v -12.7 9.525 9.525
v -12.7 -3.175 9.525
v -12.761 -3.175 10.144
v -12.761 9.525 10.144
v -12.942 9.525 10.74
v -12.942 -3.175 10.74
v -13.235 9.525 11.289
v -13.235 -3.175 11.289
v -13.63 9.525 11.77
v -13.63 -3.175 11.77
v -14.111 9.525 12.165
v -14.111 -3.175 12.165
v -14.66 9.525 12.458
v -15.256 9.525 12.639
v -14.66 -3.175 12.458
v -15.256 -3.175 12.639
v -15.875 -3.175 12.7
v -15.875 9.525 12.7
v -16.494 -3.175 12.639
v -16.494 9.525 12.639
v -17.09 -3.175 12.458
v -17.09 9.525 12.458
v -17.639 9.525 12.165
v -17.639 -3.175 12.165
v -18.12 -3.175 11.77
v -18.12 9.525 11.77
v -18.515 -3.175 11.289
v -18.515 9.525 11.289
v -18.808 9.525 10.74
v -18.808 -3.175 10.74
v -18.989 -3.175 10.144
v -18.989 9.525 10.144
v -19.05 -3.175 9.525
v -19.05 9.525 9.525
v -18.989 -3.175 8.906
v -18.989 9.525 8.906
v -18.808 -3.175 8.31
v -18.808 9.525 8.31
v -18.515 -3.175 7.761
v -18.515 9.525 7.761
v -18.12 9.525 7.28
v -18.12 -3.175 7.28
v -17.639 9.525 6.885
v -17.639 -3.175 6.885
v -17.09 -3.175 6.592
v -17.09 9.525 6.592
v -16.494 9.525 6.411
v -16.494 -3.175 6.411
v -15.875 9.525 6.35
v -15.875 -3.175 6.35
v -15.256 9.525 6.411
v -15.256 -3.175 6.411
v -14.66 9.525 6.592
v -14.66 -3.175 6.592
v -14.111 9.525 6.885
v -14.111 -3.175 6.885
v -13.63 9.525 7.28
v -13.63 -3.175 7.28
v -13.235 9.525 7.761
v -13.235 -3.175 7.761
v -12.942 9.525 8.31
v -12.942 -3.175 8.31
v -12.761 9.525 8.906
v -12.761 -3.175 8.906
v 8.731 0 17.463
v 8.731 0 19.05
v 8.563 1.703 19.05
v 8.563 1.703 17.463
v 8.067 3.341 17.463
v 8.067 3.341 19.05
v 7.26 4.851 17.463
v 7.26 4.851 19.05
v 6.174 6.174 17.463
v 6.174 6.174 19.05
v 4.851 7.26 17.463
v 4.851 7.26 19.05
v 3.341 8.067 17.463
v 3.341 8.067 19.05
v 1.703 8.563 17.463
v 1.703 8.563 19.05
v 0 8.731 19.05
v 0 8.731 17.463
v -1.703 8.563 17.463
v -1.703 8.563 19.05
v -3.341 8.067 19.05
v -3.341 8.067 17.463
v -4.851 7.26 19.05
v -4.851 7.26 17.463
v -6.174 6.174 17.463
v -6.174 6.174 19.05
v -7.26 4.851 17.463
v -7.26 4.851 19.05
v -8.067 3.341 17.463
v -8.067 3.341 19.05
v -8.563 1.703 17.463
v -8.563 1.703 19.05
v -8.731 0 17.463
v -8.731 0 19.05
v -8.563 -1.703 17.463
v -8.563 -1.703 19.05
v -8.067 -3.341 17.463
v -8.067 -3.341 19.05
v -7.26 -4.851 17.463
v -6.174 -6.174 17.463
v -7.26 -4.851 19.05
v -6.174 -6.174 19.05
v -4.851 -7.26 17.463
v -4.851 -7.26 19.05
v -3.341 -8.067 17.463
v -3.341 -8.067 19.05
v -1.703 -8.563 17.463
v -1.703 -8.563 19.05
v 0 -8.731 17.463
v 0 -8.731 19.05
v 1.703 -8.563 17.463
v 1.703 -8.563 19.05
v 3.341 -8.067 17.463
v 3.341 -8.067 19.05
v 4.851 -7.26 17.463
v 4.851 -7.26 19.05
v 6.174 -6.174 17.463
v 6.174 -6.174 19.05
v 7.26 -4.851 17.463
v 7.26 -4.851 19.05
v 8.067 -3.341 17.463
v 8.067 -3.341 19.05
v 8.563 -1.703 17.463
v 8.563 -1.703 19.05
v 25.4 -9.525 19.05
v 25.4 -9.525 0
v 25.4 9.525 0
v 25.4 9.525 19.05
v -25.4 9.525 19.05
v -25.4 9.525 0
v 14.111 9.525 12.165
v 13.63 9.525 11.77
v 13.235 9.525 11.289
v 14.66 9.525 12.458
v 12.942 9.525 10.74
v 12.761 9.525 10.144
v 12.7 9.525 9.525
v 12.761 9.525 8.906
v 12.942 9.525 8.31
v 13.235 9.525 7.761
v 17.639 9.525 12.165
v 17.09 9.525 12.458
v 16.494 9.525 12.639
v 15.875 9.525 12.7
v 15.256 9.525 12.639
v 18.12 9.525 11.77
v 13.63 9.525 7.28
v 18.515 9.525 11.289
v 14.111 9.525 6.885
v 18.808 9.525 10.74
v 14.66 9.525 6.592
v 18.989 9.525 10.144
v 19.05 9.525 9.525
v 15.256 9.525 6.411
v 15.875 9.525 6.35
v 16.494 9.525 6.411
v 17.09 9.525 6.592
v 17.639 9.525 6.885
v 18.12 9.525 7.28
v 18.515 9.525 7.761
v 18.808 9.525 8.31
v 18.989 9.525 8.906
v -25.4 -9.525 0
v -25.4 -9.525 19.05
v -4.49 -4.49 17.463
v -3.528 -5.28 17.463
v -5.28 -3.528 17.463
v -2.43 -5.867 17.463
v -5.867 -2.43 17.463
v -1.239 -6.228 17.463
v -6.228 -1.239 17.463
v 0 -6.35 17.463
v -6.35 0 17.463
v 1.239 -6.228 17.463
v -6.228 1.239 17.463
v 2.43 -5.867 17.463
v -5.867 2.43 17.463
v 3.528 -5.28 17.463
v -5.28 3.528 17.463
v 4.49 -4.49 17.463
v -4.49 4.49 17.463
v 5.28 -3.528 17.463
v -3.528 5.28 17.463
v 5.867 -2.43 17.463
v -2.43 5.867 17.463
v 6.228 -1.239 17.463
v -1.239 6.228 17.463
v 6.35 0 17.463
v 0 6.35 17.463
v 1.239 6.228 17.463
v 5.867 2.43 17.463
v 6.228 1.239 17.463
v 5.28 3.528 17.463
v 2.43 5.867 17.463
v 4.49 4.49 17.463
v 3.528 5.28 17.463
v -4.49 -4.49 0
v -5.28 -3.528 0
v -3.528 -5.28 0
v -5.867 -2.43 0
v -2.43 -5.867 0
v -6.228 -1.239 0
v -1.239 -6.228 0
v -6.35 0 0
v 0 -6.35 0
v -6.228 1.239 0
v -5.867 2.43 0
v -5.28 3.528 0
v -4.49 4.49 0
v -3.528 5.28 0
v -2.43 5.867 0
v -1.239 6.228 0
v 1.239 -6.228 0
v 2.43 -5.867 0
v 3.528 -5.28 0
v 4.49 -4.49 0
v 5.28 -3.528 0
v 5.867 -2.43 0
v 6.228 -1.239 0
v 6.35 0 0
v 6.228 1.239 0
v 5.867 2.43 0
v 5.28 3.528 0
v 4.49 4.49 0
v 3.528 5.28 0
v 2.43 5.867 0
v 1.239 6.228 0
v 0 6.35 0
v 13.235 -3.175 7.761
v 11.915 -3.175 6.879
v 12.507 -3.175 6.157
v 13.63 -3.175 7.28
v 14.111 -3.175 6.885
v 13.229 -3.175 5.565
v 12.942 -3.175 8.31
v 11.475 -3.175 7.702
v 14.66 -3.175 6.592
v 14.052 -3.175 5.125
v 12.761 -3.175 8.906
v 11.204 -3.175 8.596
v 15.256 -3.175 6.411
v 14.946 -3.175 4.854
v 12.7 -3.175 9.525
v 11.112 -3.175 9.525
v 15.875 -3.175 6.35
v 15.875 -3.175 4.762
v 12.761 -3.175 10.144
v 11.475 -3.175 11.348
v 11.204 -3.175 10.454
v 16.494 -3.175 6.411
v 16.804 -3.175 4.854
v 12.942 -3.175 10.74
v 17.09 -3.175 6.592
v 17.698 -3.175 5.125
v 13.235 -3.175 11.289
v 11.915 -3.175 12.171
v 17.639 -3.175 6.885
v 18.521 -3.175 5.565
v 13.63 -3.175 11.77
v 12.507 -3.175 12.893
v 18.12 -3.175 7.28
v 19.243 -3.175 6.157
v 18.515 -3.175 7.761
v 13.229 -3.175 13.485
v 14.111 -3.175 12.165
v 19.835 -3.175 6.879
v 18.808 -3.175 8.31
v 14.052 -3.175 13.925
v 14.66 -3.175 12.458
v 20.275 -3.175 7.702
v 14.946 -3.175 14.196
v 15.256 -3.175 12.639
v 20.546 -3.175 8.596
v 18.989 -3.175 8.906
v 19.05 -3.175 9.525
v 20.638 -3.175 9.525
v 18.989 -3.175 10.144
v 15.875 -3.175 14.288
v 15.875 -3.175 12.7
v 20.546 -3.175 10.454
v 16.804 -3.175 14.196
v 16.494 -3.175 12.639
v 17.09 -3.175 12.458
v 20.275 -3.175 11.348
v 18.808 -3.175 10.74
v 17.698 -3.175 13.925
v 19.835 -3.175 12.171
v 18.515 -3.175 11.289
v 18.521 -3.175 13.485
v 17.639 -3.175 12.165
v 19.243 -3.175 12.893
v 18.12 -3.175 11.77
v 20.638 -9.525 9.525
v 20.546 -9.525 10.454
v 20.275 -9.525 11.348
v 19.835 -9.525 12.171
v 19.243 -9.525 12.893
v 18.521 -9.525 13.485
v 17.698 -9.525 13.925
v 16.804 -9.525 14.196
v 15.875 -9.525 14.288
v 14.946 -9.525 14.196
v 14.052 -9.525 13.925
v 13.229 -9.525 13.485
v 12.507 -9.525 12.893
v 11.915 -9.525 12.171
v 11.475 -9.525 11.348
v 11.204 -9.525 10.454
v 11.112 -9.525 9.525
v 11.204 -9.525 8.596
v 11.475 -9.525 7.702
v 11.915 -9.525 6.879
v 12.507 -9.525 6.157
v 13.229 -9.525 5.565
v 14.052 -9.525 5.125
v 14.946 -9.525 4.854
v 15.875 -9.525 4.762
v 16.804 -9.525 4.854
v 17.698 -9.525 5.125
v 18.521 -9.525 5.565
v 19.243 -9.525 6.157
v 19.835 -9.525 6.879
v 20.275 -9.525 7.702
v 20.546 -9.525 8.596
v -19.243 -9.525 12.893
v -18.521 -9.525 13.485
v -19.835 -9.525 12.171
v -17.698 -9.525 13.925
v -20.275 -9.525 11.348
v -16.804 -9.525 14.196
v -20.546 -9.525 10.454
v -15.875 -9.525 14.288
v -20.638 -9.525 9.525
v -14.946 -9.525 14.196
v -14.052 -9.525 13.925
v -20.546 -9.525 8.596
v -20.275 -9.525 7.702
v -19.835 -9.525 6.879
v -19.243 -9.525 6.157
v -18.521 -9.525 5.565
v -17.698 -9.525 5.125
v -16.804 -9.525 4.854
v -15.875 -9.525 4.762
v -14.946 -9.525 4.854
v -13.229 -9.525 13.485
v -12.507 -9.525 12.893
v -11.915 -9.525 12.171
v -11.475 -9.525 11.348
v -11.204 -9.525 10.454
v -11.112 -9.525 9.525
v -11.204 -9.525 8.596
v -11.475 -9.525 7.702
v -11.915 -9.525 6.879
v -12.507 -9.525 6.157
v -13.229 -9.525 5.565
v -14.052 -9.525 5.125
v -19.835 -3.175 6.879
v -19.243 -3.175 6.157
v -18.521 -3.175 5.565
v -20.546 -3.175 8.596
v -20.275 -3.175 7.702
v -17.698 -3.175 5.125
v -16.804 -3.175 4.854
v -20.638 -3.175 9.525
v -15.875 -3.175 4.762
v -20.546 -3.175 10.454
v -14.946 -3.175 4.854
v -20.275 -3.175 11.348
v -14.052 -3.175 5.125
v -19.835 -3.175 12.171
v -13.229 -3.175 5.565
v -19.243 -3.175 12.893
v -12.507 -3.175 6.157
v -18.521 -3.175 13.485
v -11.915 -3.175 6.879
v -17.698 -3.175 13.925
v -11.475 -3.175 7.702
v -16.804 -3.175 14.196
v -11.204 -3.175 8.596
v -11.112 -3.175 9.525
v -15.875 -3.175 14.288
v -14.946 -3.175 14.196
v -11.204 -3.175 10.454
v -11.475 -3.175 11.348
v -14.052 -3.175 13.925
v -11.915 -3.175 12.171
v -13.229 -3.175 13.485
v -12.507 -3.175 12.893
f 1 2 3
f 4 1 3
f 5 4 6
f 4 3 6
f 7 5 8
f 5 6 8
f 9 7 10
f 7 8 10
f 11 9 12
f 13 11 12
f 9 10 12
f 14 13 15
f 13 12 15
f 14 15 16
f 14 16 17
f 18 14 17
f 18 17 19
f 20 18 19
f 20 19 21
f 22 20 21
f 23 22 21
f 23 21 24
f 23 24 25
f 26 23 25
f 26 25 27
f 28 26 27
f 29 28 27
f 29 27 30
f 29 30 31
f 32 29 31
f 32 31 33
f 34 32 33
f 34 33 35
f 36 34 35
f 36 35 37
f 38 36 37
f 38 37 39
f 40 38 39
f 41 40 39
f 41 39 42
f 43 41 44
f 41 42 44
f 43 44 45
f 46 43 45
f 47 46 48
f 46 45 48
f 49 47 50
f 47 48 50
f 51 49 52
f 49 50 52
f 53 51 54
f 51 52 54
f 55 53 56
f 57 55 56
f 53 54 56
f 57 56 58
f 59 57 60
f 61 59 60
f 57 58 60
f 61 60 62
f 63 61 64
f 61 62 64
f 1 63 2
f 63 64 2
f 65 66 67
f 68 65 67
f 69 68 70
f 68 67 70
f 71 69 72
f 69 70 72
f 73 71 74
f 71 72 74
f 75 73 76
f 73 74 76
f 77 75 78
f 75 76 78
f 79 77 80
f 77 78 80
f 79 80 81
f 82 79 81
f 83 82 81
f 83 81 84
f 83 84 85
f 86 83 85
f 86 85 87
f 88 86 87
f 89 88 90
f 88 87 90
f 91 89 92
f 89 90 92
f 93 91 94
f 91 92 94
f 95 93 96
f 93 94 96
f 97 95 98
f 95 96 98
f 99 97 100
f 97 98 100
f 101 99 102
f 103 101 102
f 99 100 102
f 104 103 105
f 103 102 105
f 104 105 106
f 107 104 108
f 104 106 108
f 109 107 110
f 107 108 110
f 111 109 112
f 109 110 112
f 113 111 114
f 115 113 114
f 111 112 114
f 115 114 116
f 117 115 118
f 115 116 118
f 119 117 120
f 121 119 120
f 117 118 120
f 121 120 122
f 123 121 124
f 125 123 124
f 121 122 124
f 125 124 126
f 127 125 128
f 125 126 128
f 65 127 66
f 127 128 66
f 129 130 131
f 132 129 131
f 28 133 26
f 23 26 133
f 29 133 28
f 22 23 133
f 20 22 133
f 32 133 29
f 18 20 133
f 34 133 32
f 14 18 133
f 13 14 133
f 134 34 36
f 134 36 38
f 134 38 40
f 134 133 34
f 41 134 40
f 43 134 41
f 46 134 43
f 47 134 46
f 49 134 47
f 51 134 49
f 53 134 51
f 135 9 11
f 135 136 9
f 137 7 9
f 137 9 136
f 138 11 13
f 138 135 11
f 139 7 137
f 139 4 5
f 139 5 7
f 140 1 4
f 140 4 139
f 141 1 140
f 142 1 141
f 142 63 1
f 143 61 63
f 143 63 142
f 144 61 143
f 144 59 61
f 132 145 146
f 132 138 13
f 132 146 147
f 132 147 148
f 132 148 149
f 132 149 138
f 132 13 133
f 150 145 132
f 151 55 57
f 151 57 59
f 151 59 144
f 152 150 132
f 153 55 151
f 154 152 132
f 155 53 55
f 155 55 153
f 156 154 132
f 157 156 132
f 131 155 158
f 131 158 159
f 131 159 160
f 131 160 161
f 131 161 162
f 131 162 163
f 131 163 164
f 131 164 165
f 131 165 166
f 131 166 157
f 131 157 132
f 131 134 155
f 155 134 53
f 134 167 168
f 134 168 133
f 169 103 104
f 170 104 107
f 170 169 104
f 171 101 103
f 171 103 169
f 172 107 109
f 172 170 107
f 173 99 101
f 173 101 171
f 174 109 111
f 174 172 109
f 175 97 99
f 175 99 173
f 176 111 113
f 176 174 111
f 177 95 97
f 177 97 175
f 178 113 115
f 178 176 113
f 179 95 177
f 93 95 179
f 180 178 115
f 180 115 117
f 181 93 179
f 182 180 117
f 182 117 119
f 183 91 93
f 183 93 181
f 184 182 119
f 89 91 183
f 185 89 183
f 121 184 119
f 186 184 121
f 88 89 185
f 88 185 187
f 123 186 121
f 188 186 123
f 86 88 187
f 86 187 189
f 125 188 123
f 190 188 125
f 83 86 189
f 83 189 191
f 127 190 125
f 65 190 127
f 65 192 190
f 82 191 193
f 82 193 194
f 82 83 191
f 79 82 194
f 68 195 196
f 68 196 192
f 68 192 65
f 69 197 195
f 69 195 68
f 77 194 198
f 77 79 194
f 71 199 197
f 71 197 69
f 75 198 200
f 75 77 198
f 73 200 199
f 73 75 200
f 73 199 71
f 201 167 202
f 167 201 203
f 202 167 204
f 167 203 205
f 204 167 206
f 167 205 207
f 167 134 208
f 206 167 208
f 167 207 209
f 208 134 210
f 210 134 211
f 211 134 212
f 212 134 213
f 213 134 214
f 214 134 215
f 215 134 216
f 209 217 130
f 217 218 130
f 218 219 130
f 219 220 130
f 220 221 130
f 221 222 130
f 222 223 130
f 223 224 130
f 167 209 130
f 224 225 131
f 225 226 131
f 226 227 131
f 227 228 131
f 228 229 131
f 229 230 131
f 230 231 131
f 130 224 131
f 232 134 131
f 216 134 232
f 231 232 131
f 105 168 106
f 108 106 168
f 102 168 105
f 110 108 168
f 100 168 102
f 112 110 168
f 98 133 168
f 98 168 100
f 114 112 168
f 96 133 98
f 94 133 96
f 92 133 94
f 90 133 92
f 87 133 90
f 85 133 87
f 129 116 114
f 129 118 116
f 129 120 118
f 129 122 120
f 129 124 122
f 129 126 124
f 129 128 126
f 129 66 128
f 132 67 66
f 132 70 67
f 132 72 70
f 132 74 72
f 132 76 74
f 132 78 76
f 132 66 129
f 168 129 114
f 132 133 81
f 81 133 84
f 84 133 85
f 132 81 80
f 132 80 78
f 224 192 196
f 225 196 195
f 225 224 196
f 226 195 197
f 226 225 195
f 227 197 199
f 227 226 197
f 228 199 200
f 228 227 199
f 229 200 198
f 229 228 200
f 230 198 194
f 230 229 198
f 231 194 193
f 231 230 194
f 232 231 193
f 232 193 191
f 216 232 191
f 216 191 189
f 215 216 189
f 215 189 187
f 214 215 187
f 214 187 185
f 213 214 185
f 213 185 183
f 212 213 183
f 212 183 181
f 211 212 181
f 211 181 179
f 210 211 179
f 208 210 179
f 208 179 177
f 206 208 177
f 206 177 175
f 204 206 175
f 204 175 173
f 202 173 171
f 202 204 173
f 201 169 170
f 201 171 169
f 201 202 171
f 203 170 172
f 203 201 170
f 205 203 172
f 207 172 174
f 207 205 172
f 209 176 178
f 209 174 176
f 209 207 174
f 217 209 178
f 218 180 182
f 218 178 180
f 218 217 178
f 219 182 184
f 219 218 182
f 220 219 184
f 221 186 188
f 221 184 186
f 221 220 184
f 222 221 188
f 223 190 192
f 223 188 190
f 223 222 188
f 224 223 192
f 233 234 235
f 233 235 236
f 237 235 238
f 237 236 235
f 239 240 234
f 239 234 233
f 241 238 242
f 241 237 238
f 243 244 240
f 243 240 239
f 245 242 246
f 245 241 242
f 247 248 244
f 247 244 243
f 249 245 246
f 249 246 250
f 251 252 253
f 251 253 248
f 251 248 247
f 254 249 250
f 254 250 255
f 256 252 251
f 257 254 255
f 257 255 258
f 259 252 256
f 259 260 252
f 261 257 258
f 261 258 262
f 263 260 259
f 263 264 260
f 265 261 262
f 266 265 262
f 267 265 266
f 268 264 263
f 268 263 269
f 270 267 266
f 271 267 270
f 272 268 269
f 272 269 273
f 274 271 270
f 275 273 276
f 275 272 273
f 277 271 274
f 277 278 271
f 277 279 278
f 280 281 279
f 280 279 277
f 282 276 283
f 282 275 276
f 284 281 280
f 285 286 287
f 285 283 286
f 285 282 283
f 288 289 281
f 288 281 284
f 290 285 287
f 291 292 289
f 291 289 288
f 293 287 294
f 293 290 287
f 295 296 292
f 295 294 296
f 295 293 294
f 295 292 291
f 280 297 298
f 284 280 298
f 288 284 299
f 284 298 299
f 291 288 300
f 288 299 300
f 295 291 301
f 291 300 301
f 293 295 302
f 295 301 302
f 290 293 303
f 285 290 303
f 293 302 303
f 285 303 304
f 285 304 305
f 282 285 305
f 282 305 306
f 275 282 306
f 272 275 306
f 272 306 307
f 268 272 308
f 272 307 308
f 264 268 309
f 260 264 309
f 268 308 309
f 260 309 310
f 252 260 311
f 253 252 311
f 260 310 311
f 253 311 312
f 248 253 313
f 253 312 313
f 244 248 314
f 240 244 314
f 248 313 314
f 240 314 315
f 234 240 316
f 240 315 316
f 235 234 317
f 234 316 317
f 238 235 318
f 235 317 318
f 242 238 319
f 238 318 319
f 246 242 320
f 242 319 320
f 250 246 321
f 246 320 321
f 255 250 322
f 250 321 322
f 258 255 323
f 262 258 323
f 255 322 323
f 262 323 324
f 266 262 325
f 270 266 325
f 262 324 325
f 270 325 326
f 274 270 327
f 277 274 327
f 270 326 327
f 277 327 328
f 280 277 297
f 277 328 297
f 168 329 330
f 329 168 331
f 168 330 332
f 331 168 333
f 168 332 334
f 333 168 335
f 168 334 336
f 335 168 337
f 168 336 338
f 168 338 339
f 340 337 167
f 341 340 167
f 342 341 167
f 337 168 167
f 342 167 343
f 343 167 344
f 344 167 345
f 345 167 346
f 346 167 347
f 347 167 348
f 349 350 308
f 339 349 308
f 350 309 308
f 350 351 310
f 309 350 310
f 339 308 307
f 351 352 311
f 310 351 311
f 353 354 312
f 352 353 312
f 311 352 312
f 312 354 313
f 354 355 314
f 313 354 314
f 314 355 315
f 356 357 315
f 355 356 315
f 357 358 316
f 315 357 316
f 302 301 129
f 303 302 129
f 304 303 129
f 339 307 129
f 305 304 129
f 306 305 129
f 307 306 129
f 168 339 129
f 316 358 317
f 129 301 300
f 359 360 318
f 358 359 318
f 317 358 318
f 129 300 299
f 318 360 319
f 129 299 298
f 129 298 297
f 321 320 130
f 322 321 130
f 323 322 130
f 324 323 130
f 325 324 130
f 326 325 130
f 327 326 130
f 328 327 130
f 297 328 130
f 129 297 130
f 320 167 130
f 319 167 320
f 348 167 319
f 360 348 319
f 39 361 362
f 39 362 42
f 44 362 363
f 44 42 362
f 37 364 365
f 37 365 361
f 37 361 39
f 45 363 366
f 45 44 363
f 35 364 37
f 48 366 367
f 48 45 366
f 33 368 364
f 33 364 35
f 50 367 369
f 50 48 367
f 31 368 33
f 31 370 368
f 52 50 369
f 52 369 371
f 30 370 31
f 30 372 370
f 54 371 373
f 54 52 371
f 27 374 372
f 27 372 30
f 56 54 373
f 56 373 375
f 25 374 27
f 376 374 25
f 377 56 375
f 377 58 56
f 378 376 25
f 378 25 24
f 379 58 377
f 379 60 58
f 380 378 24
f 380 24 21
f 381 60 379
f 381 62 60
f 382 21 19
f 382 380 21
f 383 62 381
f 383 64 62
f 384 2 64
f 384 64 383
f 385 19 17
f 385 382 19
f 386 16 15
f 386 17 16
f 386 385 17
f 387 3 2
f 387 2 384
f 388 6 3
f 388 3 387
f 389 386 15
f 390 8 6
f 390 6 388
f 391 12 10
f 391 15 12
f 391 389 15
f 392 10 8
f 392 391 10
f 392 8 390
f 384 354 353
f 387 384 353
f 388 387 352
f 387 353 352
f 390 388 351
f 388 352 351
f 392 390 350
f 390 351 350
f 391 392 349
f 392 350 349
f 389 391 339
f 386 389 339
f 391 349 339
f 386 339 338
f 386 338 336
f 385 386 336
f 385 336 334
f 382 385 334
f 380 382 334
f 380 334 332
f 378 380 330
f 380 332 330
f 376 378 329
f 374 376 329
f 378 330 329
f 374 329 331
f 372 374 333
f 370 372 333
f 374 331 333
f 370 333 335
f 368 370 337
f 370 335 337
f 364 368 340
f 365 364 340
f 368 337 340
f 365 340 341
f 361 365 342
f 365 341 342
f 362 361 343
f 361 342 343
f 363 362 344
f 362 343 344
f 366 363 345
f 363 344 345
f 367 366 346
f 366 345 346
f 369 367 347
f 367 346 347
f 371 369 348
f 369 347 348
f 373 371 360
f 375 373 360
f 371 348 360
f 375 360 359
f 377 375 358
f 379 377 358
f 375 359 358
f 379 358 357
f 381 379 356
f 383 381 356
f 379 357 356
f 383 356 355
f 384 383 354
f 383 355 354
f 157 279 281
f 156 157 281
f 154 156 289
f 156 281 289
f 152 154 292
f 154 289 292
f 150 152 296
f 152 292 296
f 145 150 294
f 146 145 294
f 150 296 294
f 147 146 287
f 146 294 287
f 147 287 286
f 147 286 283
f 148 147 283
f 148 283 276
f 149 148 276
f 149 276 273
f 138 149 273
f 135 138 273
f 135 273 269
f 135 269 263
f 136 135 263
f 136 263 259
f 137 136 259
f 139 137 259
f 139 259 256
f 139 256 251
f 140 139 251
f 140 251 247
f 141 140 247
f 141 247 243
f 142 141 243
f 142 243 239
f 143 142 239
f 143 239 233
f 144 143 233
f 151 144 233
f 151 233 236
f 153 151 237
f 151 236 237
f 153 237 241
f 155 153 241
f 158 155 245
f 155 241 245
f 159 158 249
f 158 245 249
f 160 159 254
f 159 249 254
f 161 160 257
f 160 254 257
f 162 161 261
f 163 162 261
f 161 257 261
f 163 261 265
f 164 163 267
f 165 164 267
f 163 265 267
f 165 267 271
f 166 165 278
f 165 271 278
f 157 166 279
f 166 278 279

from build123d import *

# Parameters (mm, degrees)
SKETCH1_W           = 50.8
SKETCH1_H           = 19.05
SKETCH1_R           = 6.35
BOSS_EXTRUDE1_DEPTH = 19.05
SKETCH2_R           = 8.73125
CUT_EXTRUDE1_DEPTH  = 1.5875
SKETCH3_R           = 3.175
CUT_EXTRUDE2_DEPTH  = 22.4155
SKETCH4_R           = 4.7625
CUT_EXTRUDE3_DEPTH  = 6.35


with BuildPart() as part:
    # Sketch1 → Boss-Extrude1 (new body)
    with BuildSketch(Plane.XY):
        Rectangle(SKETCH1_W, SKETCH1_H)
        Circle(SKETCH1_R, mode=Mode.SUBTRACT)
    extrude(amount=BOSS_EXTRUDE1_DEPTH)

    # Sketch2 → Cut-Extrude1 (cut)
    with BuildSketch(Plane.XY.offset(19.05)):
        Circle(SKETCH2_R)
    extrude(amount=-CUT_EXTRUDE1_DEPTH, mode=Mode.SUBTRACT)

    # Sketch3 → Cut-Extrude2 (cut)
    with BuildSketch(Plane.XZ.offset(9.525)):
        with Locations((-15.875, 9.525)):
            Circle(SKETCH3_R)
        with Locations((15.875, 9.525)):
            Circle(SKETCH3_R)
    extrude(amount=-CUT_EXTRUDE2_DEPTH, mode=Mode.SUBTRACT)

    # Sketch4 → Cut-Extrude3 (cut)
    with BuildSketch(Plane.XZ.offset(9.525)):
        with Locations((-15.875, 9.525)):
            Circle(SKETCH4_R)
        with Locations((15.875, 9.525)):
            Circle(SKETCH4_R)
    extrude(amount=-CUT_EXTRUDE3_DEPTH, mode=Mode.SUBTRACT)


solid = part.part
